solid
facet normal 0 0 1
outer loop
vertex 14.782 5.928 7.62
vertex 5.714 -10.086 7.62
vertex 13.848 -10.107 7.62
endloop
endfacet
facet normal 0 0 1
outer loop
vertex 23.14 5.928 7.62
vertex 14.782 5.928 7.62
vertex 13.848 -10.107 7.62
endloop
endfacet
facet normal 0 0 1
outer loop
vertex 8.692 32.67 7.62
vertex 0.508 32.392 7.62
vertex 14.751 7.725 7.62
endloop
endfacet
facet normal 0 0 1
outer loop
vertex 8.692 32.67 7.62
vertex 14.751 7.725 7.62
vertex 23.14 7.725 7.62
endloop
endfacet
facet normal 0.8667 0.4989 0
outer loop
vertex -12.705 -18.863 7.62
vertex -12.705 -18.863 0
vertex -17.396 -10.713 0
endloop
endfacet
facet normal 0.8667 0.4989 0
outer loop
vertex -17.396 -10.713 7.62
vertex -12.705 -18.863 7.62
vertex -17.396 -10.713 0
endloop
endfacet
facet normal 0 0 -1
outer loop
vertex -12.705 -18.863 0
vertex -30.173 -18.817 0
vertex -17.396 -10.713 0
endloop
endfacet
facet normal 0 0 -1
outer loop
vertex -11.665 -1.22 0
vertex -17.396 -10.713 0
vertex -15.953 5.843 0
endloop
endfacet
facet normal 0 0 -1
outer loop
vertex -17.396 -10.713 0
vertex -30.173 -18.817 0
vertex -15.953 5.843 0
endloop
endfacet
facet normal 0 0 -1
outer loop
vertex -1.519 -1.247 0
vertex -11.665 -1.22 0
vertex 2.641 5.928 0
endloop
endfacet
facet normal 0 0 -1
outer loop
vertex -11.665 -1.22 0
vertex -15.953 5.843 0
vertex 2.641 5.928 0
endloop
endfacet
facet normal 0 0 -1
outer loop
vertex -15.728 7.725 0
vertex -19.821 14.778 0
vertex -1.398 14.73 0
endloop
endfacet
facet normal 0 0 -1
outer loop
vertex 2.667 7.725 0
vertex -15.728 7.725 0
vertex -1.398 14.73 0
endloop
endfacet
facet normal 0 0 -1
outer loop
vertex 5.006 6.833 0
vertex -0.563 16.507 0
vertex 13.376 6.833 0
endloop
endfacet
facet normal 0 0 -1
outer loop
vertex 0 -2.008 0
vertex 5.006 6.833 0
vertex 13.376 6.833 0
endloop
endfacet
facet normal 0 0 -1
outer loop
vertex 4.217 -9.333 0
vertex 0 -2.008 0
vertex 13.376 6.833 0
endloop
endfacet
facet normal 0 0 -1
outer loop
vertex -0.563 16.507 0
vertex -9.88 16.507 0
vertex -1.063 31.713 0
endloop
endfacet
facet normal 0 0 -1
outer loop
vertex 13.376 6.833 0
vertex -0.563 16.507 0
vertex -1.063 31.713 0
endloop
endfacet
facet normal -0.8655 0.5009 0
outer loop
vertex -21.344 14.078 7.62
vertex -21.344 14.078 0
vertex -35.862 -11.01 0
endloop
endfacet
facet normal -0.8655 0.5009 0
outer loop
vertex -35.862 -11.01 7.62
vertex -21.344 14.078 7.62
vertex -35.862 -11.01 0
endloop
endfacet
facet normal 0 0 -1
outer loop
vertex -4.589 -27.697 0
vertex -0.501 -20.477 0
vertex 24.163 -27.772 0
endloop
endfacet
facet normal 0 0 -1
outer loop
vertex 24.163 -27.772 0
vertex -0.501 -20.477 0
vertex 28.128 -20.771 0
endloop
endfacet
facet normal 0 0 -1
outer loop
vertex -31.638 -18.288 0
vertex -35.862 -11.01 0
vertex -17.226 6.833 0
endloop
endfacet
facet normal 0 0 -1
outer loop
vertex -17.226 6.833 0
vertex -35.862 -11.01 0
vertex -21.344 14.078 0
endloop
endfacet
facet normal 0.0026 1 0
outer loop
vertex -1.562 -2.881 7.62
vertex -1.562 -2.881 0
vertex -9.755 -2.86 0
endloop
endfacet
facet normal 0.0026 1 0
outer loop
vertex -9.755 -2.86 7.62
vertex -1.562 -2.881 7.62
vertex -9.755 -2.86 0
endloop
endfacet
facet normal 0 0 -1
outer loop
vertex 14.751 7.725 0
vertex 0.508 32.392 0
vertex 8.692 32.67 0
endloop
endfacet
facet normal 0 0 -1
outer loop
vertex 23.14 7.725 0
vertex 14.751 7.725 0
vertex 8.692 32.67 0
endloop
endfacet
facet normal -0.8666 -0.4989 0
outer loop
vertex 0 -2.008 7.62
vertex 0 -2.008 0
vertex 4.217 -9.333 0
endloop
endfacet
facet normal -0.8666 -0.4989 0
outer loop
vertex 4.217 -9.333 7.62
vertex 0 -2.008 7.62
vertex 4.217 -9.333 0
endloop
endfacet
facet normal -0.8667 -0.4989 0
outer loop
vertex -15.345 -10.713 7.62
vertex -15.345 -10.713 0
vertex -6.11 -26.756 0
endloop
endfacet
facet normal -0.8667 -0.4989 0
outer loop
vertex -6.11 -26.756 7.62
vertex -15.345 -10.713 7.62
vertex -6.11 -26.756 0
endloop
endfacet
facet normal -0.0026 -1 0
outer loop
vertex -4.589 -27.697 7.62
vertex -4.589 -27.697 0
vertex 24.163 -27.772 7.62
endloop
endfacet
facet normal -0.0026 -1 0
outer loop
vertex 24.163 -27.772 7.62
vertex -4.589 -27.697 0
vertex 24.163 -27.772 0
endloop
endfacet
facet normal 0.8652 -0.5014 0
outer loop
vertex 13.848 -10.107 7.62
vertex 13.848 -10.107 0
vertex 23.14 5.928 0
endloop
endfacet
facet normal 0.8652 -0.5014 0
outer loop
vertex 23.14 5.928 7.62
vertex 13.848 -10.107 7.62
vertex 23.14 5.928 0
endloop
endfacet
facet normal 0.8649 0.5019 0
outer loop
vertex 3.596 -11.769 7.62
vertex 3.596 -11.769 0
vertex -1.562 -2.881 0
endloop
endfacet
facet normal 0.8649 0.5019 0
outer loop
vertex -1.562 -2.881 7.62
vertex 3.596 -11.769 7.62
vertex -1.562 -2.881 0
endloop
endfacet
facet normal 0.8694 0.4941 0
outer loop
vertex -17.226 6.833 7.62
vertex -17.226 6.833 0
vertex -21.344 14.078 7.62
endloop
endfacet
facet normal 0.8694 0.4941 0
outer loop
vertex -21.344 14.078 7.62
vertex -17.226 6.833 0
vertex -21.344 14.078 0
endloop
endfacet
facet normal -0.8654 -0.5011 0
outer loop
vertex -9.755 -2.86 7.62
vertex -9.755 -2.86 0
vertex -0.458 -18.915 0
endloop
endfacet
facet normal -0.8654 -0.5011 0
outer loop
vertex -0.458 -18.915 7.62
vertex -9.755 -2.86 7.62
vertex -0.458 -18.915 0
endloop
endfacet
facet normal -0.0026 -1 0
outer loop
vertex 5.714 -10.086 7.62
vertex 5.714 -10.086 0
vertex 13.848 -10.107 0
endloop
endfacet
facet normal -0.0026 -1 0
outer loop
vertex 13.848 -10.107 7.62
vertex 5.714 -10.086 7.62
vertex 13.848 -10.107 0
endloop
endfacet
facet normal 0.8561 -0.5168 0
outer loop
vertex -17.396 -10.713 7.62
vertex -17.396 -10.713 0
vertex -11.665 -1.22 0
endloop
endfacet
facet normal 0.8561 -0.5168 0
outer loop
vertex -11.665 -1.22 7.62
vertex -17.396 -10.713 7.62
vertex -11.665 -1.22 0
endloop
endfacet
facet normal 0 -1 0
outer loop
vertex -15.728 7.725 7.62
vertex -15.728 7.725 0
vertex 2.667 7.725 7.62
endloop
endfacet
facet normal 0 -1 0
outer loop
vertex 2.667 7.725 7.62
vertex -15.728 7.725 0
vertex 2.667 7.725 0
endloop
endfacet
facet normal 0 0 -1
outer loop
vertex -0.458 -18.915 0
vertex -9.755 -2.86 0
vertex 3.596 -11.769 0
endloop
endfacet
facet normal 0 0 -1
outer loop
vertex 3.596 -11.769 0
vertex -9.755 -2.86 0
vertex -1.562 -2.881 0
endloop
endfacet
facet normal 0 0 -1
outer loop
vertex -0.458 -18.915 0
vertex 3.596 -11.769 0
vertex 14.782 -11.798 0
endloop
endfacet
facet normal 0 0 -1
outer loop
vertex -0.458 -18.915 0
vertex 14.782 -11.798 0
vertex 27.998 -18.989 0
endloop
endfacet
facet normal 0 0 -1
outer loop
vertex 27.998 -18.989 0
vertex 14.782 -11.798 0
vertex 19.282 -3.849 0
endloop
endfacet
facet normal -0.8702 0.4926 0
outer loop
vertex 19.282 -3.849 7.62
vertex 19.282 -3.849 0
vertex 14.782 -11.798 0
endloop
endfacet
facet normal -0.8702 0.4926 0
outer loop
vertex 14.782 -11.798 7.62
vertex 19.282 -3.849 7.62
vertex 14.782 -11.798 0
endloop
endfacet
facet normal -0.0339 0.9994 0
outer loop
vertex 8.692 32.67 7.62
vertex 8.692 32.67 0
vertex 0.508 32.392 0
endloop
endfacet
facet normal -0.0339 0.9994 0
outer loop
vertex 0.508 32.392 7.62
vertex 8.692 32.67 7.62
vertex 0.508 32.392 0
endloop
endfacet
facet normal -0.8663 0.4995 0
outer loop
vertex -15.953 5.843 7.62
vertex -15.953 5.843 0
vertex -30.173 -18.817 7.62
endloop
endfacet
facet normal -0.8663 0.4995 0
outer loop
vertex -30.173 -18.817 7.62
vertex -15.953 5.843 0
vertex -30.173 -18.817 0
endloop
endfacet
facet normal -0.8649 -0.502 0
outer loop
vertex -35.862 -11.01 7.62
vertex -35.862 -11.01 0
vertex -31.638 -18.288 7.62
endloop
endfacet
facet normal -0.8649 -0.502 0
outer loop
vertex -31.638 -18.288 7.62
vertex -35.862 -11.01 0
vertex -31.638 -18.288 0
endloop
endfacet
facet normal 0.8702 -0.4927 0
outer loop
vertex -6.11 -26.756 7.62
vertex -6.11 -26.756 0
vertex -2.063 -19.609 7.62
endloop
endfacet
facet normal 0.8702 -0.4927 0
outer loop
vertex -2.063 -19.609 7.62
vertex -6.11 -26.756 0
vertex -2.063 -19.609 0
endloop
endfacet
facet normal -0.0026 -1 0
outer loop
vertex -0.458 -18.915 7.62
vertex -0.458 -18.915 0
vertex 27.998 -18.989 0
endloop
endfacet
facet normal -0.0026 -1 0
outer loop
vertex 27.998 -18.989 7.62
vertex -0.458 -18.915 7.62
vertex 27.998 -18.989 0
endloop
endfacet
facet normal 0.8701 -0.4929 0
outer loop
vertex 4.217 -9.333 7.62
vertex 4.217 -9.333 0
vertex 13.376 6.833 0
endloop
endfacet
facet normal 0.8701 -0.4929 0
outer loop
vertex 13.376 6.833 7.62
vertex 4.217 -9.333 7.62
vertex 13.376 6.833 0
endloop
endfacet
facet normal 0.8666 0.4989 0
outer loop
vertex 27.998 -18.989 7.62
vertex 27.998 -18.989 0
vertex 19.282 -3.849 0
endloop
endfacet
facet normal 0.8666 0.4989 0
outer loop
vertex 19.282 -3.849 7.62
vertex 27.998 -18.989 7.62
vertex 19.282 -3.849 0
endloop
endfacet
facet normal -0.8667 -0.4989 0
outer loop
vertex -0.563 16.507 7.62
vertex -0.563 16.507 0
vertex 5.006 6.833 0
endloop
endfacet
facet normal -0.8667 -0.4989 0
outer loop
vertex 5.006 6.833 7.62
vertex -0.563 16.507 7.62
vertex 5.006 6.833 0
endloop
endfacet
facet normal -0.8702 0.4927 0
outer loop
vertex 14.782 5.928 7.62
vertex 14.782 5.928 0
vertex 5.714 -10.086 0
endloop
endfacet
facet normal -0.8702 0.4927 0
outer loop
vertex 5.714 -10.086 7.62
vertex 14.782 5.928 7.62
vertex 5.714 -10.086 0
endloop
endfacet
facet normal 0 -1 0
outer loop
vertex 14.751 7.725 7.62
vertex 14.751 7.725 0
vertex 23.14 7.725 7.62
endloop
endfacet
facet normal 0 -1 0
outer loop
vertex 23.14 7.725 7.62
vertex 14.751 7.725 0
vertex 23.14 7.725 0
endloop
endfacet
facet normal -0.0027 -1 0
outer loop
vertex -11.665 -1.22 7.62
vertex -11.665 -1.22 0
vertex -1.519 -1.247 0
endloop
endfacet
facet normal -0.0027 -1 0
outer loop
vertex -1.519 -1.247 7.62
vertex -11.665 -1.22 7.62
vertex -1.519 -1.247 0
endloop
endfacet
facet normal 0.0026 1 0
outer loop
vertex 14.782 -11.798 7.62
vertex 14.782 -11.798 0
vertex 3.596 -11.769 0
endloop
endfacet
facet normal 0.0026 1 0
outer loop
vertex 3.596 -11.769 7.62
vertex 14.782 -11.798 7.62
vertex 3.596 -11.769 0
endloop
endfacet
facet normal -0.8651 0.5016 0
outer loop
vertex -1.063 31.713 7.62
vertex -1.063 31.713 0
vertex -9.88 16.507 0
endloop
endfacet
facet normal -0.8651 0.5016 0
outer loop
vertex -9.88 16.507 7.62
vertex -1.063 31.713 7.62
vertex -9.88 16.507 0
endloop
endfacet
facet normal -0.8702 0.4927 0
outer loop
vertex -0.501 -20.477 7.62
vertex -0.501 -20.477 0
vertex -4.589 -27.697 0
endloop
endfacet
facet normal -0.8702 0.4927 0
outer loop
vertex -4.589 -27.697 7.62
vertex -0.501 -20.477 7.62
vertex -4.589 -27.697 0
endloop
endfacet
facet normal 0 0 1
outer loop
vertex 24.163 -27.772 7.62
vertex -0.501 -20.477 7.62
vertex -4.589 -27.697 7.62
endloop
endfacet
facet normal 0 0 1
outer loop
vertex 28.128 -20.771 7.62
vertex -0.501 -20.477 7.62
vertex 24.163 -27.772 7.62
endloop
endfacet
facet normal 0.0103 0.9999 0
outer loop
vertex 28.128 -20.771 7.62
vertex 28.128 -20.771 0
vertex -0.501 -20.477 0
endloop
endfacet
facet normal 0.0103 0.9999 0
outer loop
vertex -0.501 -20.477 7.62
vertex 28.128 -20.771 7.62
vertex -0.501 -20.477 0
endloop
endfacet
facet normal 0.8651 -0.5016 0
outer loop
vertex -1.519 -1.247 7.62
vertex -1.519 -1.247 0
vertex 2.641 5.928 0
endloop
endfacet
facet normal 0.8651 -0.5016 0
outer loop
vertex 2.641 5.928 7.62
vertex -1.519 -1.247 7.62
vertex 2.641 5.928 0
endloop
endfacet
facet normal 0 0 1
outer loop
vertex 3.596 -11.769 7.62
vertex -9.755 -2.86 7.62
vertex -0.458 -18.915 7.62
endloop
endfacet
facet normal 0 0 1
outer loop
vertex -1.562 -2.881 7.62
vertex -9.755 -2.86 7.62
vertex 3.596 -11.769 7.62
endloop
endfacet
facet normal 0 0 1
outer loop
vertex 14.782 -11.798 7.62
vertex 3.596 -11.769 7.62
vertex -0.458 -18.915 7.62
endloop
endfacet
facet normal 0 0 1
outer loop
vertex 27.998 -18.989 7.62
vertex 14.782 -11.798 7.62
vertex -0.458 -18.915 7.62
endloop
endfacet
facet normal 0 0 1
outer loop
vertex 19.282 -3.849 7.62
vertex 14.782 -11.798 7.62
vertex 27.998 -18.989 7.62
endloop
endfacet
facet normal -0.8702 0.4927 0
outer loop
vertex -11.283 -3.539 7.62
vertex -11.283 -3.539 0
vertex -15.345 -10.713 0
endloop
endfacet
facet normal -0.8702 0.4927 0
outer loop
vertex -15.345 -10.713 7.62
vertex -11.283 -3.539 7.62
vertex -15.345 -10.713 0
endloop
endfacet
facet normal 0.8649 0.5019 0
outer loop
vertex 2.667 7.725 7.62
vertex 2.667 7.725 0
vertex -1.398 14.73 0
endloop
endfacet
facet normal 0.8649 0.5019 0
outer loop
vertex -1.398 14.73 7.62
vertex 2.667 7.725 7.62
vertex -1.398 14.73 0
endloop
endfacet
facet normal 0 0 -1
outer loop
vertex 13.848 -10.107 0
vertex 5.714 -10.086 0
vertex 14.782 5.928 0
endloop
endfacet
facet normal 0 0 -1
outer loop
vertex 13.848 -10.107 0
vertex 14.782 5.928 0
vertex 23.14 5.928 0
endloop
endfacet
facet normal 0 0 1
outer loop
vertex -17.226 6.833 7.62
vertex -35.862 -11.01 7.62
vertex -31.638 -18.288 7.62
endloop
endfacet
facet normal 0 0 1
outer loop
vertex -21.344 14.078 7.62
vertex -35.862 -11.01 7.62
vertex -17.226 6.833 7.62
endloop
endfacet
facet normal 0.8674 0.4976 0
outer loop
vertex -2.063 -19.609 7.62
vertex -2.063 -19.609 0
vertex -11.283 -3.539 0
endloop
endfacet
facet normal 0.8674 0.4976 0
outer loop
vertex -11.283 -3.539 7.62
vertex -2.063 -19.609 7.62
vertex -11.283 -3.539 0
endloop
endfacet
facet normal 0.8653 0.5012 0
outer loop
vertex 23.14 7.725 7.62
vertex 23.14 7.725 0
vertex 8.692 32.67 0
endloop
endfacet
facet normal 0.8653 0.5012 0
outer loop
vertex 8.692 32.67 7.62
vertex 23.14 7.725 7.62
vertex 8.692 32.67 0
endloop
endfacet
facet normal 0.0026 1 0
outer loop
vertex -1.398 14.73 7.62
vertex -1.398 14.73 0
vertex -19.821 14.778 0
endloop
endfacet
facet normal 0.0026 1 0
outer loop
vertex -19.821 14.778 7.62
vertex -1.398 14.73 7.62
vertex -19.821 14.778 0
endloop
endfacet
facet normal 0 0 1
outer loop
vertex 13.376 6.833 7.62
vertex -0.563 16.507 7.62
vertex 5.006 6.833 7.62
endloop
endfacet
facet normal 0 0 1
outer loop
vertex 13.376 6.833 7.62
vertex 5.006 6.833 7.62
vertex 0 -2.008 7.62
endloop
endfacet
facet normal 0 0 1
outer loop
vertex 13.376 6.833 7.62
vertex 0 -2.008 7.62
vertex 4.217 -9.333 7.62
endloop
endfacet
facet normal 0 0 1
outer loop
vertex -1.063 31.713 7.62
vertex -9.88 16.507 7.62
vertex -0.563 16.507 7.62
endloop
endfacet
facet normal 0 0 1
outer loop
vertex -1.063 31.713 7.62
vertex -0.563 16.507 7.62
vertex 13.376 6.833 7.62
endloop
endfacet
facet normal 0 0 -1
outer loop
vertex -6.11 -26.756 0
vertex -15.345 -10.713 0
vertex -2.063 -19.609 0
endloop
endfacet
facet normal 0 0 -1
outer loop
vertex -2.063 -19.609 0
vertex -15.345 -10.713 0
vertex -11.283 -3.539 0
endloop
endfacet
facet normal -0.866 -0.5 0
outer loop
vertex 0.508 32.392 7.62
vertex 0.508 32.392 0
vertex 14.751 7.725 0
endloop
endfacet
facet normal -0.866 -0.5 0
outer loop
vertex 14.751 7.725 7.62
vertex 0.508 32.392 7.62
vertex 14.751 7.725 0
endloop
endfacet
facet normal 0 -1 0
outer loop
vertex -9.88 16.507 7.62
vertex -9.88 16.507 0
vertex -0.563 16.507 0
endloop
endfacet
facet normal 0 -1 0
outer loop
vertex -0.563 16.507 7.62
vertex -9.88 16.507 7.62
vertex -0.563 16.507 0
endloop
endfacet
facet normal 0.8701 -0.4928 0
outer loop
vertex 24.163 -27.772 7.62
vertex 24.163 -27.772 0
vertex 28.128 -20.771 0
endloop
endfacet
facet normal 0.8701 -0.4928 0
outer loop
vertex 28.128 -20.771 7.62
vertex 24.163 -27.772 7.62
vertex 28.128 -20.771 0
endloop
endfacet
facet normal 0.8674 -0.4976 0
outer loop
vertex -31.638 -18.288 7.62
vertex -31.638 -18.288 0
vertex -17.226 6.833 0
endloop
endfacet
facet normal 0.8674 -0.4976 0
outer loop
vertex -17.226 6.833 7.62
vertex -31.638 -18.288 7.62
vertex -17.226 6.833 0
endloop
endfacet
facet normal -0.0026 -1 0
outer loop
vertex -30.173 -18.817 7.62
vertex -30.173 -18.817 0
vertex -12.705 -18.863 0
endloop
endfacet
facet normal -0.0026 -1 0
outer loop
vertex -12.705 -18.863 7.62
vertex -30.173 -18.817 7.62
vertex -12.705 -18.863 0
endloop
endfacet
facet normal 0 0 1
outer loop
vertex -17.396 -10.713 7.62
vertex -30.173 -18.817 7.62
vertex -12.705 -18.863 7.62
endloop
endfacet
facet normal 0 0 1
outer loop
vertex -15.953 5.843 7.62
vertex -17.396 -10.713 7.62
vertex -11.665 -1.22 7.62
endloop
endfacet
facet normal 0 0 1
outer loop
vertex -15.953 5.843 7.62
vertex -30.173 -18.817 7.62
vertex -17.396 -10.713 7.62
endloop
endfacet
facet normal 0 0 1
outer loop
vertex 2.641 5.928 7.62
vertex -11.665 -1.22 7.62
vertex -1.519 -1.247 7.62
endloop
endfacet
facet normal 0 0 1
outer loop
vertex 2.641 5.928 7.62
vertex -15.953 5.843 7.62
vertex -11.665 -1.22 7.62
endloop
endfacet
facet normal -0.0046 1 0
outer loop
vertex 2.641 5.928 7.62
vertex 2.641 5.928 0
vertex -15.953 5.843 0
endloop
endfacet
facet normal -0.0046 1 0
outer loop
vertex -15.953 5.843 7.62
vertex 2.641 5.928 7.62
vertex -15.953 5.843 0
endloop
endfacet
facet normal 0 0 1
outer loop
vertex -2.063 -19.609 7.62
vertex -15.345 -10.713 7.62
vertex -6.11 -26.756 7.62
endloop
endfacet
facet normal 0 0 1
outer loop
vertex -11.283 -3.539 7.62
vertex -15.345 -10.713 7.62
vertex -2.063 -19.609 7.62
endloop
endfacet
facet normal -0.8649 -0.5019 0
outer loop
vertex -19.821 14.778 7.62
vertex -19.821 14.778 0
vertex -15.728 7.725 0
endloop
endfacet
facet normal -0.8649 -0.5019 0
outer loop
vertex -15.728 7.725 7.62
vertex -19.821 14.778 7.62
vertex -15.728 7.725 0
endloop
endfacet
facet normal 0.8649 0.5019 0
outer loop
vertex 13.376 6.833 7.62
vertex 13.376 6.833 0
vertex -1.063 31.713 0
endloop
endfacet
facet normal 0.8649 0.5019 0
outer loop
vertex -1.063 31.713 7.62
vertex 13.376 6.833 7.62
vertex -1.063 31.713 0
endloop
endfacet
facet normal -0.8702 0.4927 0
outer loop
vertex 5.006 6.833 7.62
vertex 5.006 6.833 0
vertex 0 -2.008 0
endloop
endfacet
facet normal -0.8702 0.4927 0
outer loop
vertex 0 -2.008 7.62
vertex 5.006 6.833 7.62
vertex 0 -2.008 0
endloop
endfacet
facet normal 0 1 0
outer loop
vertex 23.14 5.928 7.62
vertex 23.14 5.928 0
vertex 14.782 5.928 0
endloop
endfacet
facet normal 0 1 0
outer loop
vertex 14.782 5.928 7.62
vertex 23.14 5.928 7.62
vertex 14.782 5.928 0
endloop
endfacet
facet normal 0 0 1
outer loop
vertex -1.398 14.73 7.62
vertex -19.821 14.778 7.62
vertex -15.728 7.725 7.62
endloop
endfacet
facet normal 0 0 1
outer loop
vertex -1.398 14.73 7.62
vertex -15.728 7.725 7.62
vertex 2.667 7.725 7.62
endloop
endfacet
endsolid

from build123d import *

# Parameters (mm, degrees)
F1_DEPTH = 7.62


with BuildPart() as f1:
    # F0 (on Top) → F1 (new body)
    with BuildSketch(Plane.XY):
        Polygon((23.13968, 7.72538), (8.692427, 32.670196), (0.508046, 32.39172), (14.750983, 7.72538), align=None)
        Polygon((13.376437, 6.832966), (-1.062605, 31.713486), (-9.879662, 16.506741), (-0.562852, 16.506741), (5.005815, 6.832966), (0, -2.007941), (4.216877, -9.333414), align=None)
        Polygon((-1.39766, 14.730163), (-19.821385, 14.778352), (-15.728297, 7.72538), (2.667462, 7.72538), align=None)
        Polygon((-17.226141, 6.832966), (-21.343851, 14.078047), (-35.861969, -11.010276), (-31.638164, -18.288492), align=None)
        Polygon((-1.519407, -1.246631), (2.640755, 5.927525), (-15.952624, 5.842623), (-30.17313, -18.817043), (-12.704655, -18.862733), (-17.395943, -10.713122), (-11.664815, -1.220095), align=None)
        Polygon((-1.56236, -2.881184), (-9.754831, -2.859756), (-0.458052, -18.915032), (27.99761, -18.98946), (19.282318, -3.849433), (14.781572, -11.798324), (3.595591, -11.769066), align=None)
        Polygon((-2.062717, -19.608561), (-11.283051, -3.538967), (-15.345134, -10.713122), (-6.109895, -26.756392), align=None)
        Polygon((28.127865, -20.770603), (-0.500591, -20.47677), (-4.588894, -27.697234), (24.163352, -27.772438), align=None)
        Polygon((23.13968, 5.927525), (14.781572, 5.927525), (5.714465, -10.086138), (13.847864, -10.107412), align=None)
    extrude(amount=F1_DEPTH)


solid = f1.part
